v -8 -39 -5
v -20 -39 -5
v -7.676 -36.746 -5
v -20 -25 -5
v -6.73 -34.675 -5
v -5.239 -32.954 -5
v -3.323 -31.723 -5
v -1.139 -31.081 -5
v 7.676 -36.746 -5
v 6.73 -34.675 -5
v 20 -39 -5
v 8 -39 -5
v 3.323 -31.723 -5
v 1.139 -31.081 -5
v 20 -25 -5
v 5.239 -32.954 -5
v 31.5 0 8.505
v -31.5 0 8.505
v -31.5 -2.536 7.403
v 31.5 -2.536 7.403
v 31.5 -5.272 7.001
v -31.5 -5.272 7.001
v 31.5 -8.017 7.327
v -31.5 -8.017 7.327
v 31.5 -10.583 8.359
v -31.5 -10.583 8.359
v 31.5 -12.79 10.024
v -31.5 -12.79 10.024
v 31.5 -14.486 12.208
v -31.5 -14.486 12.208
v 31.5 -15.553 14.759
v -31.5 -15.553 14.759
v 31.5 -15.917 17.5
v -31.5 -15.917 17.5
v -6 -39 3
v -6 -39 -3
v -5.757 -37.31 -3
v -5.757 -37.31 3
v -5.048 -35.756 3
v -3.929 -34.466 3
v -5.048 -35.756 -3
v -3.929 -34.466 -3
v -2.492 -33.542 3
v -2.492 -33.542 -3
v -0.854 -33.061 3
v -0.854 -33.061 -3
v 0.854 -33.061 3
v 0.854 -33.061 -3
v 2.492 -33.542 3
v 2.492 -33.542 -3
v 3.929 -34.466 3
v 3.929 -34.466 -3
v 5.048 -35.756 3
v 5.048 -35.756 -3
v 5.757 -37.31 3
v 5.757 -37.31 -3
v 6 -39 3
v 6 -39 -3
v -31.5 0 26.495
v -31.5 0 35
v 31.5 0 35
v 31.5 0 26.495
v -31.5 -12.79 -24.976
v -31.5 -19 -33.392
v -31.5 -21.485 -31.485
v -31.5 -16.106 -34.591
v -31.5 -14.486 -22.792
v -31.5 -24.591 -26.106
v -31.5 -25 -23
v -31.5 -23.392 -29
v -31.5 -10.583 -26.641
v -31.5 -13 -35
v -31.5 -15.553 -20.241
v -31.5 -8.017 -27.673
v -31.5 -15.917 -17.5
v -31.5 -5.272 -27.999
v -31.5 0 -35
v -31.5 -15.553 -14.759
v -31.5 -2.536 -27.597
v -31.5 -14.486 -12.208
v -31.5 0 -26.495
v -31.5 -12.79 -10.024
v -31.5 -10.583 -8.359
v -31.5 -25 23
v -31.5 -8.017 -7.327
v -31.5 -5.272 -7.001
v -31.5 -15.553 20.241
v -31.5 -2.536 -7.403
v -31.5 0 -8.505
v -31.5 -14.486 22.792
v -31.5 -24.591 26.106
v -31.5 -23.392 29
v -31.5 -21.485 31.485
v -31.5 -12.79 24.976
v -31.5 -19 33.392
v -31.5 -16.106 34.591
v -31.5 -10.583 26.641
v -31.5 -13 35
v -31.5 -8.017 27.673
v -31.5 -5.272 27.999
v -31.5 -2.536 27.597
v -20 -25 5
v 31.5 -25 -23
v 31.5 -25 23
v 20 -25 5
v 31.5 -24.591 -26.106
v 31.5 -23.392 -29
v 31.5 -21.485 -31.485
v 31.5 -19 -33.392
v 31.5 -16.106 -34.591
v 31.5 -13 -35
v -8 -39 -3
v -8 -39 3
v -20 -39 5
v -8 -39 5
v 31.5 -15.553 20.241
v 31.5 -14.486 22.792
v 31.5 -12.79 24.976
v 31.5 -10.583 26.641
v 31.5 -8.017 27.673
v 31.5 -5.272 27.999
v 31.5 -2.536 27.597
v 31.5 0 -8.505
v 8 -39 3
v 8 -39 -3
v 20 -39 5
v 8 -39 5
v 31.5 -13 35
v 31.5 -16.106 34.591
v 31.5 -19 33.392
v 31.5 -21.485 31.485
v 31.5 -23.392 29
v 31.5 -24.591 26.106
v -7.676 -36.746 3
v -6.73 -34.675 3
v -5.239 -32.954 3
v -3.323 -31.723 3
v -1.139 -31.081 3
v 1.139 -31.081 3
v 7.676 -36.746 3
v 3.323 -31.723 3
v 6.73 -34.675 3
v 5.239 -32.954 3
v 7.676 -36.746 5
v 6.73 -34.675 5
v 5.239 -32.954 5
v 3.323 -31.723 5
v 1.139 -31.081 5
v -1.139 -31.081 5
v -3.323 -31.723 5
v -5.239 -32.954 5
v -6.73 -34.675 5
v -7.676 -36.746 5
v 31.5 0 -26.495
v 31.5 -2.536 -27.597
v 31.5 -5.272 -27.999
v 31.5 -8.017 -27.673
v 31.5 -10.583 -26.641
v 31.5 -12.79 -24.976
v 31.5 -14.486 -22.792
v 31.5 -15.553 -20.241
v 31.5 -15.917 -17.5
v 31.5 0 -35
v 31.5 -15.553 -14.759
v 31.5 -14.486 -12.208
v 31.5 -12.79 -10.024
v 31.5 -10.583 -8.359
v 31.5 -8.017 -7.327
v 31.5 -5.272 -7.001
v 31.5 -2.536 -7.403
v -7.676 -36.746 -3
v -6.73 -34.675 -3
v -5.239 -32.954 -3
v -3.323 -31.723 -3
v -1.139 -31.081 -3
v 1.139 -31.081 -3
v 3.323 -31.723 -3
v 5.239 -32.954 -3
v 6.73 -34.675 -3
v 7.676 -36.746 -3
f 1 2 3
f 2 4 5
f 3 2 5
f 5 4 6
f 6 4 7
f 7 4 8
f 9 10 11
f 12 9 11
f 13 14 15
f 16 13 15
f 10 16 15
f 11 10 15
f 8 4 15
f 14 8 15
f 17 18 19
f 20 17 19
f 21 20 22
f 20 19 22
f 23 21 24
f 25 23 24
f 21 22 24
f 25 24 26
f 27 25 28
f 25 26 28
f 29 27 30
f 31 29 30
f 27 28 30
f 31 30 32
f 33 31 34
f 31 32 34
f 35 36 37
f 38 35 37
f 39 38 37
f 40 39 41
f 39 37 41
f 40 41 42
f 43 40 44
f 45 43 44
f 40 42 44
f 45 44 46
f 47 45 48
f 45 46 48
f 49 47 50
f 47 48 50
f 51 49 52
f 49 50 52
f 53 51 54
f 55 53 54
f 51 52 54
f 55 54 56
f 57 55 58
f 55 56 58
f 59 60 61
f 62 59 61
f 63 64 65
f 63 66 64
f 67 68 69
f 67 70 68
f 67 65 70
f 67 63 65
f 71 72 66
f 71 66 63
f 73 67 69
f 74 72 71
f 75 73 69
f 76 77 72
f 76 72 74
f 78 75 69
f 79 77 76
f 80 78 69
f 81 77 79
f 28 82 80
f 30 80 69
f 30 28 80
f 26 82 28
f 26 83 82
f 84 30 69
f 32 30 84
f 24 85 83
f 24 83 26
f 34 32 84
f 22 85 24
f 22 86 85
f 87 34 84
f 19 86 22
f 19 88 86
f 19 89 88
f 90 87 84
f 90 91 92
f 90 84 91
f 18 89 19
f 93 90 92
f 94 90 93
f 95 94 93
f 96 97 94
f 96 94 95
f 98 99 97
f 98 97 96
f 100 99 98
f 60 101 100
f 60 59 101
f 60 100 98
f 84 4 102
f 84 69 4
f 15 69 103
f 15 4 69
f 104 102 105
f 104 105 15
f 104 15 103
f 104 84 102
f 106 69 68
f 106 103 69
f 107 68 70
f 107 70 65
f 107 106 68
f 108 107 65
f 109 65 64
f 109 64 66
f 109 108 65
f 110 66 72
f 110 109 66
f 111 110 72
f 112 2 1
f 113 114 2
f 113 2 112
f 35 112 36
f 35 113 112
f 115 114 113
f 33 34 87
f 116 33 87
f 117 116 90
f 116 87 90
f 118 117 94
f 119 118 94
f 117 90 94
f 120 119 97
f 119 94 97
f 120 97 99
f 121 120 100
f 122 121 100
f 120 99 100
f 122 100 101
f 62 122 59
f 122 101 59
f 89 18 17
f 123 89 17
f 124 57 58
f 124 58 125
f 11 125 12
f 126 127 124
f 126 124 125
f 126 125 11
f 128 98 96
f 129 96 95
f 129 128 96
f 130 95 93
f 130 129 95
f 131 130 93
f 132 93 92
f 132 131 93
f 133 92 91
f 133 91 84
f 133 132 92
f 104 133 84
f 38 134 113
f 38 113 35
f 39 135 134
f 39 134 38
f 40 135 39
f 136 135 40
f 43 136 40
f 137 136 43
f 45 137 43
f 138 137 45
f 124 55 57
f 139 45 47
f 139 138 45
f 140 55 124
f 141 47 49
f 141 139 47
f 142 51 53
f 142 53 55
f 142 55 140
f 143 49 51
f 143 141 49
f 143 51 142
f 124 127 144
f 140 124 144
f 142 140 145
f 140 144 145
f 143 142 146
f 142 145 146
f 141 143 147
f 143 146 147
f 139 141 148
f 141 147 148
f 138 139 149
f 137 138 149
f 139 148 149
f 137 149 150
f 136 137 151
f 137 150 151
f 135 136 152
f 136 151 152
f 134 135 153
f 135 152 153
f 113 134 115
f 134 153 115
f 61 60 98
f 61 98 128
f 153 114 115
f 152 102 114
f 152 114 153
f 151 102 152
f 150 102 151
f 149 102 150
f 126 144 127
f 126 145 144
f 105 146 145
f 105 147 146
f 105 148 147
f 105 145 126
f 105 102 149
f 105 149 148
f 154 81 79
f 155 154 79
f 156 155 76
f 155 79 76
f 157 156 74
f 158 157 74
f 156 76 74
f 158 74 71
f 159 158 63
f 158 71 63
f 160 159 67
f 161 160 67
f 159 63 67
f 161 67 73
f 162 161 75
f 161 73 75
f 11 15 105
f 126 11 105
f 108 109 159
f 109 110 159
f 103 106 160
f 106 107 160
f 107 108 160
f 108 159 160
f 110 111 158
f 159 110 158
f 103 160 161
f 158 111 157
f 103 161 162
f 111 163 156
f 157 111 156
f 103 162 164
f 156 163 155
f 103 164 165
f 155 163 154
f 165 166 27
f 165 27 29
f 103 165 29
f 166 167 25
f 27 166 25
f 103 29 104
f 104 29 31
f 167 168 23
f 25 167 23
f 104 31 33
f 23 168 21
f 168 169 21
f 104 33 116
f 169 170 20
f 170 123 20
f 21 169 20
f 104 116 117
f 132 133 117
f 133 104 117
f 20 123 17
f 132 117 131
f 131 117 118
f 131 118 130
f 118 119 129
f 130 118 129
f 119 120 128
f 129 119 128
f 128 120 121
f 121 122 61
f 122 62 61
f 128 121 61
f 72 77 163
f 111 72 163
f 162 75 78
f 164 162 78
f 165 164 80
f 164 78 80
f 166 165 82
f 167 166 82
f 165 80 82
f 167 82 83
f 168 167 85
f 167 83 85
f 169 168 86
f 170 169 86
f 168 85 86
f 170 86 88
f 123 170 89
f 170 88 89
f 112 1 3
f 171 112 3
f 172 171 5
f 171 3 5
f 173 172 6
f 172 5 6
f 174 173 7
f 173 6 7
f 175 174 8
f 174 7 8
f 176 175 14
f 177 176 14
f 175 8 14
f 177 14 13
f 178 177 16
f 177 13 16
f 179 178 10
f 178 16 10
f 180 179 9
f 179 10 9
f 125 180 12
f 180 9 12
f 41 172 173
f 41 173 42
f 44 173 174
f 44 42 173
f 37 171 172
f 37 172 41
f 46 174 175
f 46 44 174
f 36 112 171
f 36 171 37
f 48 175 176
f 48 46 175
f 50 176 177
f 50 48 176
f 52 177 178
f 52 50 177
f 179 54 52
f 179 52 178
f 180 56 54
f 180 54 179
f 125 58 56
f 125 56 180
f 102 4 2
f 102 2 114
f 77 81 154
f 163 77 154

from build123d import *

# Parameters (mm, degrees)
F0_W      = 63
F0_H      = 70
F1_DEPTH  = 25
F3_DEPTH  = 63.001
F4_W      = 40
F4_H      = 10
F5_DEPTH  = 14
F7_DEPTH  = 40.001
F8_DEPTH  = 2
F9_R      = 8
F10_DEPTH = 2
F11_R     = 12


with BuildPart() as f1:
    # F0 (on Front) → F1 (new body)
    with BuildSketch(Plane.XZ):
        Rectangle(F0_W, F0_H)
    extrude(amount=F1_DEPTH)

    # F2 (on face) → F3 (cut, through all)
    with BuildSketch(Plane(origin=(-31.5, 0, 0), x_dir=(0, -1, 0), z_dir=(-1, 0, 0))):
        with BuildLine():
            ThreePointArc((0, 8.5052742394), (10.5828714835, 8.3586246097), (15.9170941003, 17.5))
            ThreePointArc((15.9170941003, 17.5), (10.5828714835, 26.6413753903), (0, 26.4947257606))
            Line((0, 26.4947257606), (0, 8.5052742394))
        make_face()
        with BuildLine():
            ThreePointArc((15.9170941003, -17.5), (10.5828714835, -8.3586246097), (0, -8.5052742394))
            Line((0, -8.5052742394), (0, -26.4947257606))
            ThreePointArc((0, -26.4947257606), (10.5828714835, -26.6413753903), (15.9170941003, -17.5))
        make_face()
    extrude(amount=-F3_DEPTH, mode=Mode.SUBTRACT)

    # F4 (on face) → F5 (join)
    with BuildSketch(Plane.XZ.offset(25)):
        Rectangle(F4_W, F4_H)
    extrude(amount=F5_DEPTH)

    # F6 (on face) → F7 (cut, through all)
    with BuildSketch(Plane(origin=(0, 0, -5), x_dir=(1, 0, 0), z_dir=(0, 0, -1))):
        with BuildLine():
            ThreePointArc((-6, 39), (0, 33), (6, 39))
            Line((6, 39), (-6, 39))
        make_face()
    extrude(amount=-F7_DEPTH, mode=Mode.SUBTRACT)

    # F6 (on face) → F8 (cut)
    with BuildSketch(Plane(origin=(0, 0, -5), x_dir=(1, 0, 0), z_dir=(0, 0, -1))):
        with BuildLine():
            ThreePointArc((-8, 39), (0, 31), (8, 39))
            Line((8, 39), (6, 39))
            ThreePointArc((6, 39), (0, 33), (-6, 39))
            Line((-6, 39), (-8, 39))
        make_face()
    extrude(amount=-F8_DEPTH, mode=Mode.SUBTRACT)

    # F9 (on face) → F10 (cut)
    with BuildSketch(Plane.XY.offset(5)):
        with Locations((0, -39)):
            Circle(F9_R)
    extrude(amount=-F10_DEPTH, mode=Mode.SUBTRACT)

    # F11
    f11_edges = [f1.edges().sort_by_distance(p)[0] for p in [
        (0, -25, 35),
        (0, -25, -35),
    ]]
    fillet(f11_edges, radius=F11_R)


solid = f1.part
